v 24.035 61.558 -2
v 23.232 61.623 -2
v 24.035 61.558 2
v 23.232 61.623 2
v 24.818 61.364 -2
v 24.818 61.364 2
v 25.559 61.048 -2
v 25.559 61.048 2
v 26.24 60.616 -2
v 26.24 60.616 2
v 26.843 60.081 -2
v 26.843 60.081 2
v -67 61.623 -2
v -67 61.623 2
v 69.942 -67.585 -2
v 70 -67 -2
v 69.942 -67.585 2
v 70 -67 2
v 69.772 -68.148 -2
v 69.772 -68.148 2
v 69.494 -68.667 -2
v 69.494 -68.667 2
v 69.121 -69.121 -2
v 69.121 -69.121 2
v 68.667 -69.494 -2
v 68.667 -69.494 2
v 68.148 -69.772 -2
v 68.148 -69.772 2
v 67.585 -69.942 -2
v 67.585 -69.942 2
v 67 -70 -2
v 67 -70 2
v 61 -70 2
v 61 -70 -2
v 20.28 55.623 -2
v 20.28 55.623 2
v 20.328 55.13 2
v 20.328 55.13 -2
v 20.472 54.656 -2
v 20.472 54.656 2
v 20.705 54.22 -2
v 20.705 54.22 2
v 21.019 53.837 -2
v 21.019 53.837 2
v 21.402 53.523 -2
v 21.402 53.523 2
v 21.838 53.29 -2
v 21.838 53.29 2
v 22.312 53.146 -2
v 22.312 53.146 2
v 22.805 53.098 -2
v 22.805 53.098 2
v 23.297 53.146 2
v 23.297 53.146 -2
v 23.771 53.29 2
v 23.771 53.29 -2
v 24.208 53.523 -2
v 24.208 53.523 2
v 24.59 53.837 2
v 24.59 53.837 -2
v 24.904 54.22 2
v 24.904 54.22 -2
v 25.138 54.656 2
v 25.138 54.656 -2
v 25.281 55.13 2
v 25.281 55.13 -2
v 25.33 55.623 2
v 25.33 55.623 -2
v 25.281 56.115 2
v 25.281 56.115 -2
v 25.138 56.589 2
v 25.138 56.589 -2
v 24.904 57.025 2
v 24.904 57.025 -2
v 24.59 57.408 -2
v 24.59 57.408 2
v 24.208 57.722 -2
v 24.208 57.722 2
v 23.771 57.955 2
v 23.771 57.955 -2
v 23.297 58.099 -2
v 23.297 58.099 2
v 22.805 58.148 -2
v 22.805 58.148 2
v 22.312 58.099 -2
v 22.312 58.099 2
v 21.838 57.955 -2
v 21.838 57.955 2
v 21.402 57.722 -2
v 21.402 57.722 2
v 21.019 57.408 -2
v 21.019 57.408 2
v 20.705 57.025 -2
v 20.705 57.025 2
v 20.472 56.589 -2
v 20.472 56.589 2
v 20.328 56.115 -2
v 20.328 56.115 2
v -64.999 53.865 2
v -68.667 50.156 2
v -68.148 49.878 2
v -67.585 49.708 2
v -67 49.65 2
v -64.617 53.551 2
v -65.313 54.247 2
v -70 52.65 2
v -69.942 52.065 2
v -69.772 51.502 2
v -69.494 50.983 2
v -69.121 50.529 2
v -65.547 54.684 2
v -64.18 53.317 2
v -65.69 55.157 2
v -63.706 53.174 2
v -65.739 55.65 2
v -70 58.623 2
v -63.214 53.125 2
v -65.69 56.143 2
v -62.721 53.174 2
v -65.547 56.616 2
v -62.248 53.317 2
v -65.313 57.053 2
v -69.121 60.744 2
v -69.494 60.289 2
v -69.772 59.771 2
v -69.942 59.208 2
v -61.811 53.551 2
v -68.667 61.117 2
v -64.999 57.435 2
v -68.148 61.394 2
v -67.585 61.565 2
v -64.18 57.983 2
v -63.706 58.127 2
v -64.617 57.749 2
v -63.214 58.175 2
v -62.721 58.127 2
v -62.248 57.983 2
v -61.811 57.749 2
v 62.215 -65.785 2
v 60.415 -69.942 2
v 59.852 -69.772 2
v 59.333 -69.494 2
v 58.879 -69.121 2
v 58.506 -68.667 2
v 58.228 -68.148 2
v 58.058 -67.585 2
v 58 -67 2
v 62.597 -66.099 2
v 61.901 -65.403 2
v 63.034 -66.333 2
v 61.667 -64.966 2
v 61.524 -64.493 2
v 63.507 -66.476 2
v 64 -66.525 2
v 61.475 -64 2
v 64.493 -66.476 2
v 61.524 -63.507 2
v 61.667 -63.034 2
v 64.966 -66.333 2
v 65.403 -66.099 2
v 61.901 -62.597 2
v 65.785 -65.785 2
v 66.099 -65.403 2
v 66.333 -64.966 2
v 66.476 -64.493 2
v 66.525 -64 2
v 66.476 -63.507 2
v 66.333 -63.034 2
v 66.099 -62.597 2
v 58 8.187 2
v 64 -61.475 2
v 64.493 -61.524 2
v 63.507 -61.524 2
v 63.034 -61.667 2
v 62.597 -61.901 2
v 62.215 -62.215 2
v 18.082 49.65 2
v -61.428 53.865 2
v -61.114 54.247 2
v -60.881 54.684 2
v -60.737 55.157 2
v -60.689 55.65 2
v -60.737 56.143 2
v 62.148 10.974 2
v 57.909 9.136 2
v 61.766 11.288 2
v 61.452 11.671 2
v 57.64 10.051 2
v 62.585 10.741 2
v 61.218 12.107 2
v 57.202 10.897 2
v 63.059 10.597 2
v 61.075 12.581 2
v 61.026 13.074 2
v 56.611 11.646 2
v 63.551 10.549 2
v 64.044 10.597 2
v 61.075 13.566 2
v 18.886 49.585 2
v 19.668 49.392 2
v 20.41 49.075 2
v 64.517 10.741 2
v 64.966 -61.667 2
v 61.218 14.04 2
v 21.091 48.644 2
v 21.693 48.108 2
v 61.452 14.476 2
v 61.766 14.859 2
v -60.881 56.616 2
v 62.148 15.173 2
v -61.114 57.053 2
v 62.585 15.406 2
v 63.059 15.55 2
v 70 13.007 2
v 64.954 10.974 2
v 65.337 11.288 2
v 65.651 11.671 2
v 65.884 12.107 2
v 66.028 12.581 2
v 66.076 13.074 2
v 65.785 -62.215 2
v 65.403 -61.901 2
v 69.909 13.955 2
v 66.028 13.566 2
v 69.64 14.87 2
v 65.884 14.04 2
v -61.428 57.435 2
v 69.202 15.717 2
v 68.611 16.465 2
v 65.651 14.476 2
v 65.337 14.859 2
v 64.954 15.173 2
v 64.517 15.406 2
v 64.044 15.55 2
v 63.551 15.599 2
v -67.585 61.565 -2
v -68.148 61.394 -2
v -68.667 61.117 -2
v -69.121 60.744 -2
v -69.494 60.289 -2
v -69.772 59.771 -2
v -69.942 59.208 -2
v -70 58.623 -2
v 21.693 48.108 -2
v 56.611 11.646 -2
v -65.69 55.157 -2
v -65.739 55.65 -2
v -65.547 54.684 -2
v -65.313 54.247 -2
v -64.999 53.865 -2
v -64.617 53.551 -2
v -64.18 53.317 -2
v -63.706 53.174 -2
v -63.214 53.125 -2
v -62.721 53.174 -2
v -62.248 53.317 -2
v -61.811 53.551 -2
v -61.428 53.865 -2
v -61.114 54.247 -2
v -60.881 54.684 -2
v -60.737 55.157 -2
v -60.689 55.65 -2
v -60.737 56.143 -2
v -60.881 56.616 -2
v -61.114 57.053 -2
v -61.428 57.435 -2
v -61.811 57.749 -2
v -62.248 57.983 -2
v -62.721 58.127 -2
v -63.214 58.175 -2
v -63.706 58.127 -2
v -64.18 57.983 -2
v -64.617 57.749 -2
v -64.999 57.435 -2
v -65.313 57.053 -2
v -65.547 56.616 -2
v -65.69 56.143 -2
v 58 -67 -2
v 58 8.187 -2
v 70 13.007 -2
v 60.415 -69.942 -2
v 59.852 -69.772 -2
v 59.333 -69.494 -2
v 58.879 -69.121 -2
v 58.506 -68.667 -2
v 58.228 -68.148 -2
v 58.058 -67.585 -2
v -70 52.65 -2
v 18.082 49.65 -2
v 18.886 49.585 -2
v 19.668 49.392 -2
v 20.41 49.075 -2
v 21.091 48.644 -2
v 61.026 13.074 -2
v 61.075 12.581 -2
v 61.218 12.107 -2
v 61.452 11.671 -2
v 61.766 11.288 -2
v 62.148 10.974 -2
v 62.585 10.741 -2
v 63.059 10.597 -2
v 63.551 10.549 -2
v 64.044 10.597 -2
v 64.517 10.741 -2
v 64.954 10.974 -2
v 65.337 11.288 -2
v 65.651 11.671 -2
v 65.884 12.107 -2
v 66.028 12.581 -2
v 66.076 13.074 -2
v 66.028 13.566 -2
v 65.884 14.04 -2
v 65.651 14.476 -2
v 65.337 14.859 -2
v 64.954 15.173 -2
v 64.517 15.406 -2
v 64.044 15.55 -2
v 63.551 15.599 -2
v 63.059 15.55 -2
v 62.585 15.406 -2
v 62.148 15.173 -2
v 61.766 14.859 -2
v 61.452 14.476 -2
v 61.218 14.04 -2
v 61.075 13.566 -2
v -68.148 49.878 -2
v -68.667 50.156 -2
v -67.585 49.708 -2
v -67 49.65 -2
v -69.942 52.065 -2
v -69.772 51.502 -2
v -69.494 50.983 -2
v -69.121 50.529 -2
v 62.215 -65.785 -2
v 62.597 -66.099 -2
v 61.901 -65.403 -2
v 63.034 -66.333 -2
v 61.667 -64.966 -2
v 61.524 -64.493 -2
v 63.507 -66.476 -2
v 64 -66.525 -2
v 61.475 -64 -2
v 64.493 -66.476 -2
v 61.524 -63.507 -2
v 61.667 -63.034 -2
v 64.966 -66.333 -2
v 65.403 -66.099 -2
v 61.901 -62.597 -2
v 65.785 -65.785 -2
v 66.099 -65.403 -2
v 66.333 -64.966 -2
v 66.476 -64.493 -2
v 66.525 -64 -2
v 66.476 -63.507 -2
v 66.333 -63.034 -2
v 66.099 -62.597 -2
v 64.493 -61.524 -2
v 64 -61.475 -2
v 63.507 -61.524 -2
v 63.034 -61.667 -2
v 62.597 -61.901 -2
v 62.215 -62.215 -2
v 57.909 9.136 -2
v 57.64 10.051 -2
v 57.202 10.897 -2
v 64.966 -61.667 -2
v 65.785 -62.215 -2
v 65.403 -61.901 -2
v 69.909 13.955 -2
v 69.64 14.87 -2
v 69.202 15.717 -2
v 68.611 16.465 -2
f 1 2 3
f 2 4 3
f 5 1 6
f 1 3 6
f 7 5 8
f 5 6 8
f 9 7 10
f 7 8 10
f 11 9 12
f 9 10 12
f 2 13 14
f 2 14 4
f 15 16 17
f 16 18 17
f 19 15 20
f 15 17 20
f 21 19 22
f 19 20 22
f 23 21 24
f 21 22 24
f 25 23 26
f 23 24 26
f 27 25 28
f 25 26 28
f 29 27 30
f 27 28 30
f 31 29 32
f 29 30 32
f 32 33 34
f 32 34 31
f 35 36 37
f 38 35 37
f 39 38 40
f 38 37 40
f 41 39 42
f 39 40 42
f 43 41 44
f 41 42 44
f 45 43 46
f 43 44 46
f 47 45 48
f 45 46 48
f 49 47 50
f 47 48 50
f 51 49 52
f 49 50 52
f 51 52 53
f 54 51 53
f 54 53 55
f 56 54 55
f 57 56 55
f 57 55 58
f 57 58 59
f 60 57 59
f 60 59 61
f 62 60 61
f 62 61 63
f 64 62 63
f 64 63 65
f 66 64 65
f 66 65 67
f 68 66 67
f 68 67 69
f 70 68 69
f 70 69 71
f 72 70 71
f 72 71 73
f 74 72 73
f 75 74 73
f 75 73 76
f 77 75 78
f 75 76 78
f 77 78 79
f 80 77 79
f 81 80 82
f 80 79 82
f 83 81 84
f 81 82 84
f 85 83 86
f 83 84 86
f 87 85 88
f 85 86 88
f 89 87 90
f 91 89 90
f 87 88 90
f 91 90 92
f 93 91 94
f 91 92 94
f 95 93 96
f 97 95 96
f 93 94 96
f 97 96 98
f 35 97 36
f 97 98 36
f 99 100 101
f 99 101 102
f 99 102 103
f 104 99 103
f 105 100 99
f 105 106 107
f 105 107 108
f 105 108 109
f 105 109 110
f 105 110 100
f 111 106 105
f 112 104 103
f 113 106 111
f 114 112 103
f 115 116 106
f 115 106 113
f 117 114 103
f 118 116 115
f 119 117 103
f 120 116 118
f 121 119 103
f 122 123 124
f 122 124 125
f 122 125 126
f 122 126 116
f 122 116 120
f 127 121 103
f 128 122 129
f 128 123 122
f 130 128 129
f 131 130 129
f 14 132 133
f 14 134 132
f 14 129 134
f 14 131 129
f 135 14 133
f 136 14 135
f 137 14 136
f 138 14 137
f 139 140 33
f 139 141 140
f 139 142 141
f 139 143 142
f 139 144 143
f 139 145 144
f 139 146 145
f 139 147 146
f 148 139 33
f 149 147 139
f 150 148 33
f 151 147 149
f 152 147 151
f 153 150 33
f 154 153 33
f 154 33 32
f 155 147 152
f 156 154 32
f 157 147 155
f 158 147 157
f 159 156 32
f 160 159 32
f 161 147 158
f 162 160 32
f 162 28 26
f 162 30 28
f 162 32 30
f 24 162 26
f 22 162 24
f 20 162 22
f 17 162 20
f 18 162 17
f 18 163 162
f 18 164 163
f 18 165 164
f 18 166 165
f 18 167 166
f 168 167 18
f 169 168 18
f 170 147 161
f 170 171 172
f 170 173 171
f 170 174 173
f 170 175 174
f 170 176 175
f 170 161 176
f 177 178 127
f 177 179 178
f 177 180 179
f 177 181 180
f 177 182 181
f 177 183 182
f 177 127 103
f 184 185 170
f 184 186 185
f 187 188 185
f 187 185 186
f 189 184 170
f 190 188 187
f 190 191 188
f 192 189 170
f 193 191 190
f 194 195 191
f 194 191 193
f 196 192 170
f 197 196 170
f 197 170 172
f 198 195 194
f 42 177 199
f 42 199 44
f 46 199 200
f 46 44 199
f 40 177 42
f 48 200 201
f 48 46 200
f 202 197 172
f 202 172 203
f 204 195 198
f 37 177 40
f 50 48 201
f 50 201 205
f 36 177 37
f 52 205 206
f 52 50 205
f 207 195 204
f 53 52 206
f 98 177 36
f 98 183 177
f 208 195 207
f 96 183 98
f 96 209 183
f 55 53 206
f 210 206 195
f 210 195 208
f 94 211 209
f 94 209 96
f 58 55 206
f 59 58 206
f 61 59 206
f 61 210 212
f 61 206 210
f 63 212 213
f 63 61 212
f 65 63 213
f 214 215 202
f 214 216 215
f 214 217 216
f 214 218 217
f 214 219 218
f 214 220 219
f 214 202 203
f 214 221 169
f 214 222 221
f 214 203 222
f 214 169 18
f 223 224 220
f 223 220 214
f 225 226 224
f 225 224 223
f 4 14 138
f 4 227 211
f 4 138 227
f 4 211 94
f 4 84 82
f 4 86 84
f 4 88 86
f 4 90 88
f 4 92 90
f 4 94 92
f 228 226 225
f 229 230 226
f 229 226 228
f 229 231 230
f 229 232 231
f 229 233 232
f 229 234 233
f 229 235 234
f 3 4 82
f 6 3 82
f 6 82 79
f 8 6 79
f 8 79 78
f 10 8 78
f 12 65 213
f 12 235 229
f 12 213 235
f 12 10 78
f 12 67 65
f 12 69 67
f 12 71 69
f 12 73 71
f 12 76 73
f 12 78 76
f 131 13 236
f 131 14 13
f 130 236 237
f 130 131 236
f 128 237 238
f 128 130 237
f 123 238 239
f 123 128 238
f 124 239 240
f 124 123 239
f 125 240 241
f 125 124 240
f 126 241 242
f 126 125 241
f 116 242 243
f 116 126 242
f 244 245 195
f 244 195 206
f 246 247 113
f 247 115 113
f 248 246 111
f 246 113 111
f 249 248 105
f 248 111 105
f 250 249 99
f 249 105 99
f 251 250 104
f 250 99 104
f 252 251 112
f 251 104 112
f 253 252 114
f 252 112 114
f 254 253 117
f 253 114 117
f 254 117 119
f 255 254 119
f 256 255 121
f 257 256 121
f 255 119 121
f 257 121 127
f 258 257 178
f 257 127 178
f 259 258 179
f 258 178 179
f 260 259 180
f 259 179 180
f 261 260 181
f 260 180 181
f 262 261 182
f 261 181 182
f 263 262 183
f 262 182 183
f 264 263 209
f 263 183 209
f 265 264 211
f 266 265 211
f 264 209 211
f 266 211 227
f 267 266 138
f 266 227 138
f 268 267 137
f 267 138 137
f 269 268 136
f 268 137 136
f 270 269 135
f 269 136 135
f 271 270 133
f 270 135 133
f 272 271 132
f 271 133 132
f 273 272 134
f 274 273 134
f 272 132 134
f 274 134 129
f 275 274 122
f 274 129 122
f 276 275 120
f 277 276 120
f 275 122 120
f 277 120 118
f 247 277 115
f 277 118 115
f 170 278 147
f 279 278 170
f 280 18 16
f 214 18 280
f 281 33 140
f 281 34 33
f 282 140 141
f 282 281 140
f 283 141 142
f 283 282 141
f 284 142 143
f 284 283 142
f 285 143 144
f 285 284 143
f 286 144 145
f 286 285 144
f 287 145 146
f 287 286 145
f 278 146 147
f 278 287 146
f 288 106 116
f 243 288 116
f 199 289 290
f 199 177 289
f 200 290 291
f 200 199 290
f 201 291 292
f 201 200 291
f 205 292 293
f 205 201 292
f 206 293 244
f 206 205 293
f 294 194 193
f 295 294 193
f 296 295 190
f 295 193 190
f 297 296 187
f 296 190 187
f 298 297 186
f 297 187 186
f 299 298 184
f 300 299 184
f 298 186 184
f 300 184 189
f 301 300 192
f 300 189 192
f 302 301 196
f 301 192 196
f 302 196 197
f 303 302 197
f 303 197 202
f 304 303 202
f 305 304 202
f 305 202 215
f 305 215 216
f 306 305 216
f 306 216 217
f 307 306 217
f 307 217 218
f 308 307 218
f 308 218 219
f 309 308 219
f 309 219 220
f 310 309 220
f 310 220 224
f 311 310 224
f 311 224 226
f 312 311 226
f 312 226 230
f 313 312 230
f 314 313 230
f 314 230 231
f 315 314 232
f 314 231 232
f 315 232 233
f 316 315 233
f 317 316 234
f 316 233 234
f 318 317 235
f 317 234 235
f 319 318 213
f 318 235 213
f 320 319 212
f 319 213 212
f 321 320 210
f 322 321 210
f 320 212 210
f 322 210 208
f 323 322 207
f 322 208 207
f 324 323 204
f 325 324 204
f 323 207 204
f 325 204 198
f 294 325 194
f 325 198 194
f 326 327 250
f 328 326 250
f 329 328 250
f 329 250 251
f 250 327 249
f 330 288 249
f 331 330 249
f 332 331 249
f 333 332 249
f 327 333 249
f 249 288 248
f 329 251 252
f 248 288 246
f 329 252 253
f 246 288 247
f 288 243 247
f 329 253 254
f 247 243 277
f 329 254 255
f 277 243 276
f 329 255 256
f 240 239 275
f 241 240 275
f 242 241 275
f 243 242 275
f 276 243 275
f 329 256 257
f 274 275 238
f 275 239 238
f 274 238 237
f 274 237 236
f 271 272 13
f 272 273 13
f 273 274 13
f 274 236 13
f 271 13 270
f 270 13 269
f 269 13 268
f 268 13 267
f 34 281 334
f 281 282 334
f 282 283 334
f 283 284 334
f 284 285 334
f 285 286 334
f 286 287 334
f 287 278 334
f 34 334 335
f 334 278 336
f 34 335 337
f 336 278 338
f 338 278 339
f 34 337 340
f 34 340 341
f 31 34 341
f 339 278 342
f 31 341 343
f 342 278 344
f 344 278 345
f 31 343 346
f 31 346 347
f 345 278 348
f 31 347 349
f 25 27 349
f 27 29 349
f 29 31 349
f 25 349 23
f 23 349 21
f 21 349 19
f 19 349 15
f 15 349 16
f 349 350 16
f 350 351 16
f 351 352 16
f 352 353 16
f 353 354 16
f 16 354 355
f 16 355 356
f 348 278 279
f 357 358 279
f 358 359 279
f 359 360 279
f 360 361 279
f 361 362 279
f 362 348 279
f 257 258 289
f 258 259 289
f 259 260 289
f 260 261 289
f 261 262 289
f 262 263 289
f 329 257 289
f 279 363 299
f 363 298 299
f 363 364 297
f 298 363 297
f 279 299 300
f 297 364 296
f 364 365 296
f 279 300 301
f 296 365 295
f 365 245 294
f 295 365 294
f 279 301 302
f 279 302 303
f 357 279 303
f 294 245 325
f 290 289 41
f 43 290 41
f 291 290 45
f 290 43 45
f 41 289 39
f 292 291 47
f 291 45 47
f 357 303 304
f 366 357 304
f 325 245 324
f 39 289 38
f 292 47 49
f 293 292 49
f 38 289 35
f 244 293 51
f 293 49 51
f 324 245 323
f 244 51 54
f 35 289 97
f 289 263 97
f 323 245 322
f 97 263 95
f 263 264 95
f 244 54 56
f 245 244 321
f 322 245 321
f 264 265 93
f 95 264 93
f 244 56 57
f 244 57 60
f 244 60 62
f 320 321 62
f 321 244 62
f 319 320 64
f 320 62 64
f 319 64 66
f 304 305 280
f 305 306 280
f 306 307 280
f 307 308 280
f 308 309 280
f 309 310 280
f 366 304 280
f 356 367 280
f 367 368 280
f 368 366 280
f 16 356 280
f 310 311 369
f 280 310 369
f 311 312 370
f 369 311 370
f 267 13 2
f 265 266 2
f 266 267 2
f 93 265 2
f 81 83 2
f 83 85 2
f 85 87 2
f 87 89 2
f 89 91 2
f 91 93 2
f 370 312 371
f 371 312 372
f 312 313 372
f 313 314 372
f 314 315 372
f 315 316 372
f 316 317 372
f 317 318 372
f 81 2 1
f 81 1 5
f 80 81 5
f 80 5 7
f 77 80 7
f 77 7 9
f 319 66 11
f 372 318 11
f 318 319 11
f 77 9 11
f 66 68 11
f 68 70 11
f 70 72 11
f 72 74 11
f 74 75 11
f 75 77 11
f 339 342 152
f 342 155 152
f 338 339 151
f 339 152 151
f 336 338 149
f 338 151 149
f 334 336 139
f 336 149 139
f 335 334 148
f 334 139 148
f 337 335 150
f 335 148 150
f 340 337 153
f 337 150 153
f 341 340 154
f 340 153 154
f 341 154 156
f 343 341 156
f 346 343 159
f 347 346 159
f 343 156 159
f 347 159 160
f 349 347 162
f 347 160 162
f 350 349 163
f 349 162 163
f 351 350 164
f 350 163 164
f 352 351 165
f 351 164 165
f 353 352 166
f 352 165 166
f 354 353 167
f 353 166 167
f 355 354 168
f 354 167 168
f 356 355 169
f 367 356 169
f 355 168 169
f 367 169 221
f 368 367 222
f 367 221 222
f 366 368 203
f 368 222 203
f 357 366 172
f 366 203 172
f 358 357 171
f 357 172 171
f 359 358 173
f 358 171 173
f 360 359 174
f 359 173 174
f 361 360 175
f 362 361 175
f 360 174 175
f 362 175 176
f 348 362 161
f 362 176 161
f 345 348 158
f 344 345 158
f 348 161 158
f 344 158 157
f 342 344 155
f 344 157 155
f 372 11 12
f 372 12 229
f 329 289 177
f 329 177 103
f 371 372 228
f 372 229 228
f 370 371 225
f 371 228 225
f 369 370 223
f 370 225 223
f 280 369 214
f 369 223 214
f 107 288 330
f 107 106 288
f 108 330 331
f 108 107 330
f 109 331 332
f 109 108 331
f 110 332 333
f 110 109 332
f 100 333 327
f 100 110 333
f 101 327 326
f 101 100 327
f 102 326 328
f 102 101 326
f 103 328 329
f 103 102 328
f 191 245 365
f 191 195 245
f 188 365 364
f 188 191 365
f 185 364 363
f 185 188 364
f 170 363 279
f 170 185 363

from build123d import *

# Parameters (mm, degrees)
SKETCH_1_W          = 140
SKETCH_1_H          = 140
EXTRUDE_1_DEPTH     = 2
SKETCH_2_R          = 2.525
CUT_EXTRUDE_1_DEPTH = 12
SKETCH_3_R          = 2.525
CUT_EXTRUDE_2_DEPTH = 17
SKETCH_4_OUTSIDE_W  = 181.606
SKETCH_4_OUTSIDE_H  = 181.606
CUT_EXTRUDE_3_DEPTH = 22
FILLET_1_R          = 3
FILLET_2_R          = 3
FILLET_3_R          = 5


with BuildPart() as part:
    # 草图1 → 凸台-拉伸1 (new, symmetric)
    with BuildSketch(Plane.XY):
        Rectangle(SKETCH_1_W, SKETCH_1_H)
    extrude(amount=EXTRUDE_1_DEPTH, both=True)

    # 草图2 → 切除-拉伸1 (cut, symmetric)
    with BuildSketch(Plane.XY.offset(2)):
        with Locations(Location((64, -64, 0), (0, 0, 180))):
            Circle(SKETCH_2_R)
    extrude(amount=CUT_EXTRUDE_1_DEPTH, both=True, mode=Mode.SUBTRACT)

    # 草图3 → 切除-拉伸2 (cut, symmetric)
    with BuildSketch(Plane.XY.offset(2)):
        with Locations(Location((63.551189893, 13.073625474, 0), (0, 0, 180))):
            Circle(SKETCH_3_R)
        with Locations(Location((22.804744615, 55.6226511, 0), (0, 0, 180))):
            Circle(SKETCH_3_R)
        with Locations(Location((-63.213858355, 55.65002484, 0), (0, 0, 180))):
            Circle(SKETCH_3_R)
    extrude(amount=CUT_EXTRUDE_2_DEPTH, both=True, mode=Mode.SUBTRACT)

    # 草图4 outside → 切除-拉伸3 (cut, symmetric)
    with BuildSketch(Plane(origin=(0, 0, -2), x_dir=(-1, 0, 0), z_dir=(0, 0, -1))):
        Rectangle(SKETCH_4_OUTSIDE_W, SKETCH_4_OUTSIDE_H)
        Polygon((-58, -70), (-58, 10.195392206), (-20.216854418, 49.65002484), (70, 49.65002484), (70, 61.6226511), (-25.366420755, 61.6226511), (-70, 15.014528745), (-70, -70), align=None, mode=Mode.SUBTRACT)
    extrude(amount=CUT_EXTRUDE_3_DEPTH, both=True, mode=Mode.SUBTRACT)

    # 圆角1
    fillet_1_edges = [part.edges().sort_by_distance(p)[0] for p in [
        (58, -70, 0),
        (70, -70, 0),
    ]]
    fillet(fillet_1_edges, radius=FILLET_1_R)

    # 圆角2
    fillet_2_edges = [part.edges().sort_by_distance(p)[0] for p in [
        (-70, 61.6226511, 0),
        (-70, 49.65002484, 0),
    ]]
    fillet(fillet_2_edges, radius=FILLET_2_R)

    # 圆角3
    fillet_3_edges = [part.edges().sort_by_distance(p)[0] for p in [
        (70, 15.014528745, 0),
        (25.366420755, 61.6226511, 0),
        (20.216854418, 49.65002484, 0),
        (58, 10.195392206, 0),
    ]]
    fillet(fillet_3_edges, radius=FILLET_3_R)


solid = part.part
